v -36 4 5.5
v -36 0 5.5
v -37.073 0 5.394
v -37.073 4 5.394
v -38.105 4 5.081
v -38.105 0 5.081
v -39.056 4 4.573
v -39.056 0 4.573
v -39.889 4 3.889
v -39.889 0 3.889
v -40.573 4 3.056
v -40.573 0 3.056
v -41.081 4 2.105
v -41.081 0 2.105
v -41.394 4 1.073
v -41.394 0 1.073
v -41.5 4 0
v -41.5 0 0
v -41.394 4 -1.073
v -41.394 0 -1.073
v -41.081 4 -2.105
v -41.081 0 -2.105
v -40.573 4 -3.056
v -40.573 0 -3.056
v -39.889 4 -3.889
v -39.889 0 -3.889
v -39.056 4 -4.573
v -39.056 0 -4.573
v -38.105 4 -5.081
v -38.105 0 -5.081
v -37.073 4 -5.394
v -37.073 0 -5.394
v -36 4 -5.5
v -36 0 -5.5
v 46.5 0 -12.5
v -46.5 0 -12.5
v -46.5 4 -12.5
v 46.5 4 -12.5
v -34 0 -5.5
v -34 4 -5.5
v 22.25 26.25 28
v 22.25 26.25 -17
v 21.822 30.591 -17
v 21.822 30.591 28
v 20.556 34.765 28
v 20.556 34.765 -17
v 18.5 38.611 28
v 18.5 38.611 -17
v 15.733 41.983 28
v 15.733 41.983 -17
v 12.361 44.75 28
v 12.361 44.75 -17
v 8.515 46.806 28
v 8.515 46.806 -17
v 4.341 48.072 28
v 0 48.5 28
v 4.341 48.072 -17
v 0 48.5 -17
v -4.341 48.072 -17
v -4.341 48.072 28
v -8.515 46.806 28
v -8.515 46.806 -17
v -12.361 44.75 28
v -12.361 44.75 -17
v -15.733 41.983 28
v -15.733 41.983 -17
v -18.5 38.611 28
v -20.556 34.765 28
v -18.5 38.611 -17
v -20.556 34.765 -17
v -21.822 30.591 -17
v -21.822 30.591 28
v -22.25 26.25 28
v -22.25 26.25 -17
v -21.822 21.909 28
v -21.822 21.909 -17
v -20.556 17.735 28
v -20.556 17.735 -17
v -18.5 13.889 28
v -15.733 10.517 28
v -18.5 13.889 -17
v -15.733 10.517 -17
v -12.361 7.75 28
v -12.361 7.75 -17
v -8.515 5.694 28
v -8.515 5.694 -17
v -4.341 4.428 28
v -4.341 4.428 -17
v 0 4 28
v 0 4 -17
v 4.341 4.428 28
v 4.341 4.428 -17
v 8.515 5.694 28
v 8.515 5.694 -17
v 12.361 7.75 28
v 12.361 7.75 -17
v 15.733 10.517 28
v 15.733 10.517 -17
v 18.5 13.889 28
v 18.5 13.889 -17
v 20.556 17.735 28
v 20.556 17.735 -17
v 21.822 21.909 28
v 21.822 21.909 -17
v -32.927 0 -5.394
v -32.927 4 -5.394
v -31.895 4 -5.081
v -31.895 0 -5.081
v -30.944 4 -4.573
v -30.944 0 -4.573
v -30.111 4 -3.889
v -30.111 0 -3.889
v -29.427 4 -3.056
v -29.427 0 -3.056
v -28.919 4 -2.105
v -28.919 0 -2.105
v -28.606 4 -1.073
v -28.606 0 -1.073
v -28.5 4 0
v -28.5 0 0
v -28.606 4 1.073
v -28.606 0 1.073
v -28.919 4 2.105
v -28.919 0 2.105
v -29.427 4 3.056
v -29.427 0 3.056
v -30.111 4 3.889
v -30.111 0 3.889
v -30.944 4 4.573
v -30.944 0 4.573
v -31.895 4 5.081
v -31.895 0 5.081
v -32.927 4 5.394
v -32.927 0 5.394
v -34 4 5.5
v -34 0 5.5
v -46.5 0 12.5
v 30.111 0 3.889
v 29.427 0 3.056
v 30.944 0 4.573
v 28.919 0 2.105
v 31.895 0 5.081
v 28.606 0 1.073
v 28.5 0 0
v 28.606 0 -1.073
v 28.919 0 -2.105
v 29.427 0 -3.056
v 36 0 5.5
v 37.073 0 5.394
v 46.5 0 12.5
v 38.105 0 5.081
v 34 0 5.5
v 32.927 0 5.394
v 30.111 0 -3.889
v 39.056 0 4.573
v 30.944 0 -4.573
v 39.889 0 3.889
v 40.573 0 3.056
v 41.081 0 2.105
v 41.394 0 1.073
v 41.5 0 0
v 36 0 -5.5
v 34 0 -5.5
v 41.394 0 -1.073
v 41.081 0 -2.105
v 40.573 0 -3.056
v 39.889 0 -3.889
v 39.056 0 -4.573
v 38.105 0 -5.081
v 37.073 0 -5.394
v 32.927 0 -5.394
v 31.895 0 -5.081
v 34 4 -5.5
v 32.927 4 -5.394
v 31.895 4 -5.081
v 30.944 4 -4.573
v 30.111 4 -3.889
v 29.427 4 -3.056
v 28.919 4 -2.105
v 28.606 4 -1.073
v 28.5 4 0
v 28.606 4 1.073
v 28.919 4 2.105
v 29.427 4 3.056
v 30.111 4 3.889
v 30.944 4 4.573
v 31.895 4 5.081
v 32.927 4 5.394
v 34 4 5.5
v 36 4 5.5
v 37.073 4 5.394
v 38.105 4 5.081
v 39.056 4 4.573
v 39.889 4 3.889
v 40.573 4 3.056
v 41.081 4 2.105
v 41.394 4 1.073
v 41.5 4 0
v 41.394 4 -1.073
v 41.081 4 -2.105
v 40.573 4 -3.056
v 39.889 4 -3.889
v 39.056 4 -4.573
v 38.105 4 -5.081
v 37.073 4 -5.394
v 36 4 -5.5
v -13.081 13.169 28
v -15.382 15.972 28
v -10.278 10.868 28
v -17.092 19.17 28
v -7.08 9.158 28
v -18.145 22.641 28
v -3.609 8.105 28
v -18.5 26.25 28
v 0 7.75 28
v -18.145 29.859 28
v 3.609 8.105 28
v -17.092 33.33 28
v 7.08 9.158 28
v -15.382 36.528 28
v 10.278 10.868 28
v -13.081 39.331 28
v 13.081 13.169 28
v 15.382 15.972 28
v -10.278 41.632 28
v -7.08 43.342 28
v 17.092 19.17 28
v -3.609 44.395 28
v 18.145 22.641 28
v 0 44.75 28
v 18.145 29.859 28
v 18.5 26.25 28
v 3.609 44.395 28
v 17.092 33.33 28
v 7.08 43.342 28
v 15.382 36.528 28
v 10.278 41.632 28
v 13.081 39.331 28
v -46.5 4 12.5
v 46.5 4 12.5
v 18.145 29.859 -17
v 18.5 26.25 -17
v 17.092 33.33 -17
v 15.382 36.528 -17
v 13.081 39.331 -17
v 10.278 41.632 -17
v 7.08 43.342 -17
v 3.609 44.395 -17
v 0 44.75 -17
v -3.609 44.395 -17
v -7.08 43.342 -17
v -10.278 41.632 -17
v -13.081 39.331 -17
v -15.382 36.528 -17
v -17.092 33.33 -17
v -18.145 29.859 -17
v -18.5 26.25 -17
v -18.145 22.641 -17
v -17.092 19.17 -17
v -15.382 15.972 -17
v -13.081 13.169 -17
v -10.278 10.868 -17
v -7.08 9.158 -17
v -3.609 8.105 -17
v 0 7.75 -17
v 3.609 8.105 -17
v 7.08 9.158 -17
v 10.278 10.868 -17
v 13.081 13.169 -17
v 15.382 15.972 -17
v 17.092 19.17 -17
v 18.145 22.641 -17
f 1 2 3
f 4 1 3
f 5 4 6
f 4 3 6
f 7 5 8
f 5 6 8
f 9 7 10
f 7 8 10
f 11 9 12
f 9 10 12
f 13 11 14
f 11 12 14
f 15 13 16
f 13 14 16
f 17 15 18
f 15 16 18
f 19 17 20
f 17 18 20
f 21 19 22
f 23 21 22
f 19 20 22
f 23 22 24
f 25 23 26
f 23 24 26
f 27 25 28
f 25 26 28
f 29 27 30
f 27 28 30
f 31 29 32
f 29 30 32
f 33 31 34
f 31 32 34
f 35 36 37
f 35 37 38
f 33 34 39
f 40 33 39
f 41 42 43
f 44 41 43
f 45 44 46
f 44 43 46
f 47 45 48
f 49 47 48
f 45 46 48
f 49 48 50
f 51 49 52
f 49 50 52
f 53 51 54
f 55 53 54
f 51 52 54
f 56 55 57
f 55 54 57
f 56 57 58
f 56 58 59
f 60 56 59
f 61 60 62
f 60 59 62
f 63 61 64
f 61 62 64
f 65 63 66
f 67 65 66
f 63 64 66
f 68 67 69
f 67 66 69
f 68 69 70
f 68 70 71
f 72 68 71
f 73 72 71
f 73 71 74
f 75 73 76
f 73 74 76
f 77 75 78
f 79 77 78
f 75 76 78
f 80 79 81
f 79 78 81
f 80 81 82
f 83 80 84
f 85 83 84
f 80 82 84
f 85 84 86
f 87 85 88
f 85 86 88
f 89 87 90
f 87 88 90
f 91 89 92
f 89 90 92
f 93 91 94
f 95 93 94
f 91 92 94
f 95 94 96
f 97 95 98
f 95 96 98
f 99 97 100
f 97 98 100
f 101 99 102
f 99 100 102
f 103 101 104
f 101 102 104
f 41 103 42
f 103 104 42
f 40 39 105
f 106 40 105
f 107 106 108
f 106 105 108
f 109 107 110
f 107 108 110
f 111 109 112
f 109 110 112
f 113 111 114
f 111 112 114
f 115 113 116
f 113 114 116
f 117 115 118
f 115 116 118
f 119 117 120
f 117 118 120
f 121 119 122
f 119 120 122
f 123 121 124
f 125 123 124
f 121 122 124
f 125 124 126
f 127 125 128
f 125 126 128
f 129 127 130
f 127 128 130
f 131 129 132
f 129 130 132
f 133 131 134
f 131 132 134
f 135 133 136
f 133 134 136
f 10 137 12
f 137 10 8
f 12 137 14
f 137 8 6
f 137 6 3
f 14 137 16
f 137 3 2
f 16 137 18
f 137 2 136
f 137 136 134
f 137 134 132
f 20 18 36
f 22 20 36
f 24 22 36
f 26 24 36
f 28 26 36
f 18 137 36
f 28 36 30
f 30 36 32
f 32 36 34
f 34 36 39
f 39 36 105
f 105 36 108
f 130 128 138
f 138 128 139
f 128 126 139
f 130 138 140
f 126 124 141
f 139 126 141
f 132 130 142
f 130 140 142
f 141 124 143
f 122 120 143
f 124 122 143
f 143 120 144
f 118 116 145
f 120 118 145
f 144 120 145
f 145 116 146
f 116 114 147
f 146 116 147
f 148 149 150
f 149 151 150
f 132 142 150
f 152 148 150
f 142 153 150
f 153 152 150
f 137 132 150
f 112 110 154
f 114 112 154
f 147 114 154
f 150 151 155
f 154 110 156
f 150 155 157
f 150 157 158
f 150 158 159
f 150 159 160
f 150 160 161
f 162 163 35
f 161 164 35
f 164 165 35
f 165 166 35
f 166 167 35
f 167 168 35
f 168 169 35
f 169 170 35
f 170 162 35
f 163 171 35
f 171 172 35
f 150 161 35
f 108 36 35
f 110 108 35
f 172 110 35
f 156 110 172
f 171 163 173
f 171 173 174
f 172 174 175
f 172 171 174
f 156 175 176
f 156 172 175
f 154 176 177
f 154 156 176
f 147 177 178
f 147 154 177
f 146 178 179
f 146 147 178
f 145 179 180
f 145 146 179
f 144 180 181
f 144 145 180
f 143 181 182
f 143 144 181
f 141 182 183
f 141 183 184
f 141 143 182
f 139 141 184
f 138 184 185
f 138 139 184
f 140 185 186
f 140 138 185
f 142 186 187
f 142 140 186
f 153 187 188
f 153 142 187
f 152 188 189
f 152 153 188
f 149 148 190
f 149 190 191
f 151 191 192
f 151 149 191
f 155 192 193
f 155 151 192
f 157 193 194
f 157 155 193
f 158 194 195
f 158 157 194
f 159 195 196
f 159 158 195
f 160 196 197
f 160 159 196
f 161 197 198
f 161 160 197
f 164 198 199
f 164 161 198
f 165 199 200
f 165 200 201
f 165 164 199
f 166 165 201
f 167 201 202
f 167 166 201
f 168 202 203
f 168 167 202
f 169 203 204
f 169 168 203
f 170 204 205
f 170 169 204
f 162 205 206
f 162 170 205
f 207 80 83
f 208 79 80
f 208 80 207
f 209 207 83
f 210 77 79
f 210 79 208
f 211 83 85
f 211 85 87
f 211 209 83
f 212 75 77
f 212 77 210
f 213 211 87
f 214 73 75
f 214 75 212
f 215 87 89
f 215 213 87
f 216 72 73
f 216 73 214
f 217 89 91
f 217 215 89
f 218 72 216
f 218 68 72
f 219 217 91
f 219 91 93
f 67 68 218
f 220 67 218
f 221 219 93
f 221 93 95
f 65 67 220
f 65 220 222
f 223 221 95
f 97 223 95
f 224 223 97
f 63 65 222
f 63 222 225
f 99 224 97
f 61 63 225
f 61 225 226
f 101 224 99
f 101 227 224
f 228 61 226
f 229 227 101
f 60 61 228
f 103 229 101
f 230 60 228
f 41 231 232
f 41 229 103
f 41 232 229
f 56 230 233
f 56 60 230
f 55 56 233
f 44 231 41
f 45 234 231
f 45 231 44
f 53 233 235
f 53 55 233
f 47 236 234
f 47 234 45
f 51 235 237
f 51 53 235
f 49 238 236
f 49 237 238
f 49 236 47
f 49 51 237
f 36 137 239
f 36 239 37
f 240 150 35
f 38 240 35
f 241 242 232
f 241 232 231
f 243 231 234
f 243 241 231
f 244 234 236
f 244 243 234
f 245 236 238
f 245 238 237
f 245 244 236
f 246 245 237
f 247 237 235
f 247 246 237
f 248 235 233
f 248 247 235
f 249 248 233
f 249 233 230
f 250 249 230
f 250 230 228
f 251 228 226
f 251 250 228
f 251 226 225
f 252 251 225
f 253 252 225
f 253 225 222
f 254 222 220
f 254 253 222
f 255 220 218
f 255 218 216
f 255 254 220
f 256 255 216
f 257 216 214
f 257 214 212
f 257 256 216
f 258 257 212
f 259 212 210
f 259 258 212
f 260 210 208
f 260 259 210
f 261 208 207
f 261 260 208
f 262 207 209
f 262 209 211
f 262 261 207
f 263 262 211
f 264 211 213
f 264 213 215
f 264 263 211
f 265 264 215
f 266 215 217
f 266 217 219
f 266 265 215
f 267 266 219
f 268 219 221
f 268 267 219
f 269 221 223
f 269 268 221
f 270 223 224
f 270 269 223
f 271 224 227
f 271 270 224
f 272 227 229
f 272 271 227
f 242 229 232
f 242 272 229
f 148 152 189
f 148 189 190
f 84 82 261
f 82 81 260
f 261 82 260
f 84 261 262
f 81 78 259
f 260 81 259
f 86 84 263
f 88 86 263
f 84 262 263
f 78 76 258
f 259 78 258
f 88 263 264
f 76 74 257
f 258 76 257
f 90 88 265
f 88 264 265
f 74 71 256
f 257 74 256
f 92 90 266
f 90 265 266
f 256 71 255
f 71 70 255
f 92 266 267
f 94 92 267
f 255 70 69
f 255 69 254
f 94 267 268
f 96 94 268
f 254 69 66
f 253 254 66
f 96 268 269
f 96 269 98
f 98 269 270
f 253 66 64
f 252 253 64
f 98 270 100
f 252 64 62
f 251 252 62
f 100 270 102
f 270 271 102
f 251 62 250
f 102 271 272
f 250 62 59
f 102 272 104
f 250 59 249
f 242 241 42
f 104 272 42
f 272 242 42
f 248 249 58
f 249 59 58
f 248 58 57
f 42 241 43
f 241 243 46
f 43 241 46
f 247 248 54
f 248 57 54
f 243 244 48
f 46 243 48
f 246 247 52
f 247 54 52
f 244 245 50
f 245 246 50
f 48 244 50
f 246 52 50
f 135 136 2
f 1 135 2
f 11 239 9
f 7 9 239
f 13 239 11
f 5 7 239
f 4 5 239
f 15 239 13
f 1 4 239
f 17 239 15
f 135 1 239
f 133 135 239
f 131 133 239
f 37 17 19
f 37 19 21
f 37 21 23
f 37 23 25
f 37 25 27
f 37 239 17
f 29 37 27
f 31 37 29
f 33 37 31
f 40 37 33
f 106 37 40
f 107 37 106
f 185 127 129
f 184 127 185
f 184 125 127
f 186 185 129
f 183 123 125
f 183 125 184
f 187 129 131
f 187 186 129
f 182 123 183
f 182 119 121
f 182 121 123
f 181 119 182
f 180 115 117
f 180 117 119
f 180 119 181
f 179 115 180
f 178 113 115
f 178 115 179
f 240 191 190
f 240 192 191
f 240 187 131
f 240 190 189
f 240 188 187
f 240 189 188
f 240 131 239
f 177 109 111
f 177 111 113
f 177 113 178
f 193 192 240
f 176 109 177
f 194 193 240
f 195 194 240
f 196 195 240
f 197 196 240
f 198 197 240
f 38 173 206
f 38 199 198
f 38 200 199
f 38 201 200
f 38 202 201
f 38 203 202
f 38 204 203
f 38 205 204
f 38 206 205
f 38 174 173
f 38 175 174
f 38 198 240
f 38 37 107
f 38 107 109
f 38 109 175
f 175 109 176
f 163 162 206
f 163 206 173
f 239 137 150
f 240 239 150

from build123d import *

# Parameters (mm, degrees)
SKETCH_1_W           = 93
SKETCH_1_H           = 25
EXTRUDE_1_DEPTH      = 4
EXTRUDE_2_DEPTH      = 15.5
EXTRUDE_2_DEPTH_BACK = 29.5
SKETCH_2_R           = 22.25
SKETCH_2_R_2         = 18.5


with BuildPart() as part:
    # Эскиз1 → Бобышка-Вытянуть1 (new body)
    with BuildSketch(Plane(origin=(0, 0, 0), x_dir=(1, 0, 0), z_dir=(0, 1, 0))):
        Rectangle(SKETCH_1_W, SKETCH_1_H)
        with BuildLine():
            Line((-36, 5.5), (-34, 5.5))
            ThreePointArc((-34, 5.5), (-28.5, 0), (-34, -5.5))
            Line((-34, -5.5), (-36, -5.5))
            ThreePointArc((-36, -5.5), (-41.5, 0), (-36, 5.5))
        make_face(mode=Mode.SUBTRACT)
        with BuildLine():
            Line((36, 5.5), (34, 5.5))
            ThreePointArc((34, 5.5), (28.5, 0), (34, -5.5))
            Line((34, -5.5), (36, -5.5))
            ThreePointArc((36, -5.5), (41.5, 0), (36, 5.5))
        make_face(mode=Mode.SUBTRACT)
    extrude(amount=EXTRUDE_1_DEPTH)


with BuildPart() as body_2:
    # Эскиз2 → Бобышка-Вытянуть2 (new, two sides: drawn at the far end of the back side and taken through both)
    with BuildSketch(Plane.XY.offset(12.5).offset(-EXTRUDE_2_DEPTH_BACK)):
        with Locations((0, 26.25)):
            Circle(SKETCH_2_R)
        with Locations((0, 26.25)):
            Circle(SKETCH_2_R_2, mode=Mode.SUBTRACT)
    extrude(amount=EXTRUDE_2_DEPTH + EXTRUDE_2_DEPTH_BACK)


solid = Compound([part.part, body_2.part])
